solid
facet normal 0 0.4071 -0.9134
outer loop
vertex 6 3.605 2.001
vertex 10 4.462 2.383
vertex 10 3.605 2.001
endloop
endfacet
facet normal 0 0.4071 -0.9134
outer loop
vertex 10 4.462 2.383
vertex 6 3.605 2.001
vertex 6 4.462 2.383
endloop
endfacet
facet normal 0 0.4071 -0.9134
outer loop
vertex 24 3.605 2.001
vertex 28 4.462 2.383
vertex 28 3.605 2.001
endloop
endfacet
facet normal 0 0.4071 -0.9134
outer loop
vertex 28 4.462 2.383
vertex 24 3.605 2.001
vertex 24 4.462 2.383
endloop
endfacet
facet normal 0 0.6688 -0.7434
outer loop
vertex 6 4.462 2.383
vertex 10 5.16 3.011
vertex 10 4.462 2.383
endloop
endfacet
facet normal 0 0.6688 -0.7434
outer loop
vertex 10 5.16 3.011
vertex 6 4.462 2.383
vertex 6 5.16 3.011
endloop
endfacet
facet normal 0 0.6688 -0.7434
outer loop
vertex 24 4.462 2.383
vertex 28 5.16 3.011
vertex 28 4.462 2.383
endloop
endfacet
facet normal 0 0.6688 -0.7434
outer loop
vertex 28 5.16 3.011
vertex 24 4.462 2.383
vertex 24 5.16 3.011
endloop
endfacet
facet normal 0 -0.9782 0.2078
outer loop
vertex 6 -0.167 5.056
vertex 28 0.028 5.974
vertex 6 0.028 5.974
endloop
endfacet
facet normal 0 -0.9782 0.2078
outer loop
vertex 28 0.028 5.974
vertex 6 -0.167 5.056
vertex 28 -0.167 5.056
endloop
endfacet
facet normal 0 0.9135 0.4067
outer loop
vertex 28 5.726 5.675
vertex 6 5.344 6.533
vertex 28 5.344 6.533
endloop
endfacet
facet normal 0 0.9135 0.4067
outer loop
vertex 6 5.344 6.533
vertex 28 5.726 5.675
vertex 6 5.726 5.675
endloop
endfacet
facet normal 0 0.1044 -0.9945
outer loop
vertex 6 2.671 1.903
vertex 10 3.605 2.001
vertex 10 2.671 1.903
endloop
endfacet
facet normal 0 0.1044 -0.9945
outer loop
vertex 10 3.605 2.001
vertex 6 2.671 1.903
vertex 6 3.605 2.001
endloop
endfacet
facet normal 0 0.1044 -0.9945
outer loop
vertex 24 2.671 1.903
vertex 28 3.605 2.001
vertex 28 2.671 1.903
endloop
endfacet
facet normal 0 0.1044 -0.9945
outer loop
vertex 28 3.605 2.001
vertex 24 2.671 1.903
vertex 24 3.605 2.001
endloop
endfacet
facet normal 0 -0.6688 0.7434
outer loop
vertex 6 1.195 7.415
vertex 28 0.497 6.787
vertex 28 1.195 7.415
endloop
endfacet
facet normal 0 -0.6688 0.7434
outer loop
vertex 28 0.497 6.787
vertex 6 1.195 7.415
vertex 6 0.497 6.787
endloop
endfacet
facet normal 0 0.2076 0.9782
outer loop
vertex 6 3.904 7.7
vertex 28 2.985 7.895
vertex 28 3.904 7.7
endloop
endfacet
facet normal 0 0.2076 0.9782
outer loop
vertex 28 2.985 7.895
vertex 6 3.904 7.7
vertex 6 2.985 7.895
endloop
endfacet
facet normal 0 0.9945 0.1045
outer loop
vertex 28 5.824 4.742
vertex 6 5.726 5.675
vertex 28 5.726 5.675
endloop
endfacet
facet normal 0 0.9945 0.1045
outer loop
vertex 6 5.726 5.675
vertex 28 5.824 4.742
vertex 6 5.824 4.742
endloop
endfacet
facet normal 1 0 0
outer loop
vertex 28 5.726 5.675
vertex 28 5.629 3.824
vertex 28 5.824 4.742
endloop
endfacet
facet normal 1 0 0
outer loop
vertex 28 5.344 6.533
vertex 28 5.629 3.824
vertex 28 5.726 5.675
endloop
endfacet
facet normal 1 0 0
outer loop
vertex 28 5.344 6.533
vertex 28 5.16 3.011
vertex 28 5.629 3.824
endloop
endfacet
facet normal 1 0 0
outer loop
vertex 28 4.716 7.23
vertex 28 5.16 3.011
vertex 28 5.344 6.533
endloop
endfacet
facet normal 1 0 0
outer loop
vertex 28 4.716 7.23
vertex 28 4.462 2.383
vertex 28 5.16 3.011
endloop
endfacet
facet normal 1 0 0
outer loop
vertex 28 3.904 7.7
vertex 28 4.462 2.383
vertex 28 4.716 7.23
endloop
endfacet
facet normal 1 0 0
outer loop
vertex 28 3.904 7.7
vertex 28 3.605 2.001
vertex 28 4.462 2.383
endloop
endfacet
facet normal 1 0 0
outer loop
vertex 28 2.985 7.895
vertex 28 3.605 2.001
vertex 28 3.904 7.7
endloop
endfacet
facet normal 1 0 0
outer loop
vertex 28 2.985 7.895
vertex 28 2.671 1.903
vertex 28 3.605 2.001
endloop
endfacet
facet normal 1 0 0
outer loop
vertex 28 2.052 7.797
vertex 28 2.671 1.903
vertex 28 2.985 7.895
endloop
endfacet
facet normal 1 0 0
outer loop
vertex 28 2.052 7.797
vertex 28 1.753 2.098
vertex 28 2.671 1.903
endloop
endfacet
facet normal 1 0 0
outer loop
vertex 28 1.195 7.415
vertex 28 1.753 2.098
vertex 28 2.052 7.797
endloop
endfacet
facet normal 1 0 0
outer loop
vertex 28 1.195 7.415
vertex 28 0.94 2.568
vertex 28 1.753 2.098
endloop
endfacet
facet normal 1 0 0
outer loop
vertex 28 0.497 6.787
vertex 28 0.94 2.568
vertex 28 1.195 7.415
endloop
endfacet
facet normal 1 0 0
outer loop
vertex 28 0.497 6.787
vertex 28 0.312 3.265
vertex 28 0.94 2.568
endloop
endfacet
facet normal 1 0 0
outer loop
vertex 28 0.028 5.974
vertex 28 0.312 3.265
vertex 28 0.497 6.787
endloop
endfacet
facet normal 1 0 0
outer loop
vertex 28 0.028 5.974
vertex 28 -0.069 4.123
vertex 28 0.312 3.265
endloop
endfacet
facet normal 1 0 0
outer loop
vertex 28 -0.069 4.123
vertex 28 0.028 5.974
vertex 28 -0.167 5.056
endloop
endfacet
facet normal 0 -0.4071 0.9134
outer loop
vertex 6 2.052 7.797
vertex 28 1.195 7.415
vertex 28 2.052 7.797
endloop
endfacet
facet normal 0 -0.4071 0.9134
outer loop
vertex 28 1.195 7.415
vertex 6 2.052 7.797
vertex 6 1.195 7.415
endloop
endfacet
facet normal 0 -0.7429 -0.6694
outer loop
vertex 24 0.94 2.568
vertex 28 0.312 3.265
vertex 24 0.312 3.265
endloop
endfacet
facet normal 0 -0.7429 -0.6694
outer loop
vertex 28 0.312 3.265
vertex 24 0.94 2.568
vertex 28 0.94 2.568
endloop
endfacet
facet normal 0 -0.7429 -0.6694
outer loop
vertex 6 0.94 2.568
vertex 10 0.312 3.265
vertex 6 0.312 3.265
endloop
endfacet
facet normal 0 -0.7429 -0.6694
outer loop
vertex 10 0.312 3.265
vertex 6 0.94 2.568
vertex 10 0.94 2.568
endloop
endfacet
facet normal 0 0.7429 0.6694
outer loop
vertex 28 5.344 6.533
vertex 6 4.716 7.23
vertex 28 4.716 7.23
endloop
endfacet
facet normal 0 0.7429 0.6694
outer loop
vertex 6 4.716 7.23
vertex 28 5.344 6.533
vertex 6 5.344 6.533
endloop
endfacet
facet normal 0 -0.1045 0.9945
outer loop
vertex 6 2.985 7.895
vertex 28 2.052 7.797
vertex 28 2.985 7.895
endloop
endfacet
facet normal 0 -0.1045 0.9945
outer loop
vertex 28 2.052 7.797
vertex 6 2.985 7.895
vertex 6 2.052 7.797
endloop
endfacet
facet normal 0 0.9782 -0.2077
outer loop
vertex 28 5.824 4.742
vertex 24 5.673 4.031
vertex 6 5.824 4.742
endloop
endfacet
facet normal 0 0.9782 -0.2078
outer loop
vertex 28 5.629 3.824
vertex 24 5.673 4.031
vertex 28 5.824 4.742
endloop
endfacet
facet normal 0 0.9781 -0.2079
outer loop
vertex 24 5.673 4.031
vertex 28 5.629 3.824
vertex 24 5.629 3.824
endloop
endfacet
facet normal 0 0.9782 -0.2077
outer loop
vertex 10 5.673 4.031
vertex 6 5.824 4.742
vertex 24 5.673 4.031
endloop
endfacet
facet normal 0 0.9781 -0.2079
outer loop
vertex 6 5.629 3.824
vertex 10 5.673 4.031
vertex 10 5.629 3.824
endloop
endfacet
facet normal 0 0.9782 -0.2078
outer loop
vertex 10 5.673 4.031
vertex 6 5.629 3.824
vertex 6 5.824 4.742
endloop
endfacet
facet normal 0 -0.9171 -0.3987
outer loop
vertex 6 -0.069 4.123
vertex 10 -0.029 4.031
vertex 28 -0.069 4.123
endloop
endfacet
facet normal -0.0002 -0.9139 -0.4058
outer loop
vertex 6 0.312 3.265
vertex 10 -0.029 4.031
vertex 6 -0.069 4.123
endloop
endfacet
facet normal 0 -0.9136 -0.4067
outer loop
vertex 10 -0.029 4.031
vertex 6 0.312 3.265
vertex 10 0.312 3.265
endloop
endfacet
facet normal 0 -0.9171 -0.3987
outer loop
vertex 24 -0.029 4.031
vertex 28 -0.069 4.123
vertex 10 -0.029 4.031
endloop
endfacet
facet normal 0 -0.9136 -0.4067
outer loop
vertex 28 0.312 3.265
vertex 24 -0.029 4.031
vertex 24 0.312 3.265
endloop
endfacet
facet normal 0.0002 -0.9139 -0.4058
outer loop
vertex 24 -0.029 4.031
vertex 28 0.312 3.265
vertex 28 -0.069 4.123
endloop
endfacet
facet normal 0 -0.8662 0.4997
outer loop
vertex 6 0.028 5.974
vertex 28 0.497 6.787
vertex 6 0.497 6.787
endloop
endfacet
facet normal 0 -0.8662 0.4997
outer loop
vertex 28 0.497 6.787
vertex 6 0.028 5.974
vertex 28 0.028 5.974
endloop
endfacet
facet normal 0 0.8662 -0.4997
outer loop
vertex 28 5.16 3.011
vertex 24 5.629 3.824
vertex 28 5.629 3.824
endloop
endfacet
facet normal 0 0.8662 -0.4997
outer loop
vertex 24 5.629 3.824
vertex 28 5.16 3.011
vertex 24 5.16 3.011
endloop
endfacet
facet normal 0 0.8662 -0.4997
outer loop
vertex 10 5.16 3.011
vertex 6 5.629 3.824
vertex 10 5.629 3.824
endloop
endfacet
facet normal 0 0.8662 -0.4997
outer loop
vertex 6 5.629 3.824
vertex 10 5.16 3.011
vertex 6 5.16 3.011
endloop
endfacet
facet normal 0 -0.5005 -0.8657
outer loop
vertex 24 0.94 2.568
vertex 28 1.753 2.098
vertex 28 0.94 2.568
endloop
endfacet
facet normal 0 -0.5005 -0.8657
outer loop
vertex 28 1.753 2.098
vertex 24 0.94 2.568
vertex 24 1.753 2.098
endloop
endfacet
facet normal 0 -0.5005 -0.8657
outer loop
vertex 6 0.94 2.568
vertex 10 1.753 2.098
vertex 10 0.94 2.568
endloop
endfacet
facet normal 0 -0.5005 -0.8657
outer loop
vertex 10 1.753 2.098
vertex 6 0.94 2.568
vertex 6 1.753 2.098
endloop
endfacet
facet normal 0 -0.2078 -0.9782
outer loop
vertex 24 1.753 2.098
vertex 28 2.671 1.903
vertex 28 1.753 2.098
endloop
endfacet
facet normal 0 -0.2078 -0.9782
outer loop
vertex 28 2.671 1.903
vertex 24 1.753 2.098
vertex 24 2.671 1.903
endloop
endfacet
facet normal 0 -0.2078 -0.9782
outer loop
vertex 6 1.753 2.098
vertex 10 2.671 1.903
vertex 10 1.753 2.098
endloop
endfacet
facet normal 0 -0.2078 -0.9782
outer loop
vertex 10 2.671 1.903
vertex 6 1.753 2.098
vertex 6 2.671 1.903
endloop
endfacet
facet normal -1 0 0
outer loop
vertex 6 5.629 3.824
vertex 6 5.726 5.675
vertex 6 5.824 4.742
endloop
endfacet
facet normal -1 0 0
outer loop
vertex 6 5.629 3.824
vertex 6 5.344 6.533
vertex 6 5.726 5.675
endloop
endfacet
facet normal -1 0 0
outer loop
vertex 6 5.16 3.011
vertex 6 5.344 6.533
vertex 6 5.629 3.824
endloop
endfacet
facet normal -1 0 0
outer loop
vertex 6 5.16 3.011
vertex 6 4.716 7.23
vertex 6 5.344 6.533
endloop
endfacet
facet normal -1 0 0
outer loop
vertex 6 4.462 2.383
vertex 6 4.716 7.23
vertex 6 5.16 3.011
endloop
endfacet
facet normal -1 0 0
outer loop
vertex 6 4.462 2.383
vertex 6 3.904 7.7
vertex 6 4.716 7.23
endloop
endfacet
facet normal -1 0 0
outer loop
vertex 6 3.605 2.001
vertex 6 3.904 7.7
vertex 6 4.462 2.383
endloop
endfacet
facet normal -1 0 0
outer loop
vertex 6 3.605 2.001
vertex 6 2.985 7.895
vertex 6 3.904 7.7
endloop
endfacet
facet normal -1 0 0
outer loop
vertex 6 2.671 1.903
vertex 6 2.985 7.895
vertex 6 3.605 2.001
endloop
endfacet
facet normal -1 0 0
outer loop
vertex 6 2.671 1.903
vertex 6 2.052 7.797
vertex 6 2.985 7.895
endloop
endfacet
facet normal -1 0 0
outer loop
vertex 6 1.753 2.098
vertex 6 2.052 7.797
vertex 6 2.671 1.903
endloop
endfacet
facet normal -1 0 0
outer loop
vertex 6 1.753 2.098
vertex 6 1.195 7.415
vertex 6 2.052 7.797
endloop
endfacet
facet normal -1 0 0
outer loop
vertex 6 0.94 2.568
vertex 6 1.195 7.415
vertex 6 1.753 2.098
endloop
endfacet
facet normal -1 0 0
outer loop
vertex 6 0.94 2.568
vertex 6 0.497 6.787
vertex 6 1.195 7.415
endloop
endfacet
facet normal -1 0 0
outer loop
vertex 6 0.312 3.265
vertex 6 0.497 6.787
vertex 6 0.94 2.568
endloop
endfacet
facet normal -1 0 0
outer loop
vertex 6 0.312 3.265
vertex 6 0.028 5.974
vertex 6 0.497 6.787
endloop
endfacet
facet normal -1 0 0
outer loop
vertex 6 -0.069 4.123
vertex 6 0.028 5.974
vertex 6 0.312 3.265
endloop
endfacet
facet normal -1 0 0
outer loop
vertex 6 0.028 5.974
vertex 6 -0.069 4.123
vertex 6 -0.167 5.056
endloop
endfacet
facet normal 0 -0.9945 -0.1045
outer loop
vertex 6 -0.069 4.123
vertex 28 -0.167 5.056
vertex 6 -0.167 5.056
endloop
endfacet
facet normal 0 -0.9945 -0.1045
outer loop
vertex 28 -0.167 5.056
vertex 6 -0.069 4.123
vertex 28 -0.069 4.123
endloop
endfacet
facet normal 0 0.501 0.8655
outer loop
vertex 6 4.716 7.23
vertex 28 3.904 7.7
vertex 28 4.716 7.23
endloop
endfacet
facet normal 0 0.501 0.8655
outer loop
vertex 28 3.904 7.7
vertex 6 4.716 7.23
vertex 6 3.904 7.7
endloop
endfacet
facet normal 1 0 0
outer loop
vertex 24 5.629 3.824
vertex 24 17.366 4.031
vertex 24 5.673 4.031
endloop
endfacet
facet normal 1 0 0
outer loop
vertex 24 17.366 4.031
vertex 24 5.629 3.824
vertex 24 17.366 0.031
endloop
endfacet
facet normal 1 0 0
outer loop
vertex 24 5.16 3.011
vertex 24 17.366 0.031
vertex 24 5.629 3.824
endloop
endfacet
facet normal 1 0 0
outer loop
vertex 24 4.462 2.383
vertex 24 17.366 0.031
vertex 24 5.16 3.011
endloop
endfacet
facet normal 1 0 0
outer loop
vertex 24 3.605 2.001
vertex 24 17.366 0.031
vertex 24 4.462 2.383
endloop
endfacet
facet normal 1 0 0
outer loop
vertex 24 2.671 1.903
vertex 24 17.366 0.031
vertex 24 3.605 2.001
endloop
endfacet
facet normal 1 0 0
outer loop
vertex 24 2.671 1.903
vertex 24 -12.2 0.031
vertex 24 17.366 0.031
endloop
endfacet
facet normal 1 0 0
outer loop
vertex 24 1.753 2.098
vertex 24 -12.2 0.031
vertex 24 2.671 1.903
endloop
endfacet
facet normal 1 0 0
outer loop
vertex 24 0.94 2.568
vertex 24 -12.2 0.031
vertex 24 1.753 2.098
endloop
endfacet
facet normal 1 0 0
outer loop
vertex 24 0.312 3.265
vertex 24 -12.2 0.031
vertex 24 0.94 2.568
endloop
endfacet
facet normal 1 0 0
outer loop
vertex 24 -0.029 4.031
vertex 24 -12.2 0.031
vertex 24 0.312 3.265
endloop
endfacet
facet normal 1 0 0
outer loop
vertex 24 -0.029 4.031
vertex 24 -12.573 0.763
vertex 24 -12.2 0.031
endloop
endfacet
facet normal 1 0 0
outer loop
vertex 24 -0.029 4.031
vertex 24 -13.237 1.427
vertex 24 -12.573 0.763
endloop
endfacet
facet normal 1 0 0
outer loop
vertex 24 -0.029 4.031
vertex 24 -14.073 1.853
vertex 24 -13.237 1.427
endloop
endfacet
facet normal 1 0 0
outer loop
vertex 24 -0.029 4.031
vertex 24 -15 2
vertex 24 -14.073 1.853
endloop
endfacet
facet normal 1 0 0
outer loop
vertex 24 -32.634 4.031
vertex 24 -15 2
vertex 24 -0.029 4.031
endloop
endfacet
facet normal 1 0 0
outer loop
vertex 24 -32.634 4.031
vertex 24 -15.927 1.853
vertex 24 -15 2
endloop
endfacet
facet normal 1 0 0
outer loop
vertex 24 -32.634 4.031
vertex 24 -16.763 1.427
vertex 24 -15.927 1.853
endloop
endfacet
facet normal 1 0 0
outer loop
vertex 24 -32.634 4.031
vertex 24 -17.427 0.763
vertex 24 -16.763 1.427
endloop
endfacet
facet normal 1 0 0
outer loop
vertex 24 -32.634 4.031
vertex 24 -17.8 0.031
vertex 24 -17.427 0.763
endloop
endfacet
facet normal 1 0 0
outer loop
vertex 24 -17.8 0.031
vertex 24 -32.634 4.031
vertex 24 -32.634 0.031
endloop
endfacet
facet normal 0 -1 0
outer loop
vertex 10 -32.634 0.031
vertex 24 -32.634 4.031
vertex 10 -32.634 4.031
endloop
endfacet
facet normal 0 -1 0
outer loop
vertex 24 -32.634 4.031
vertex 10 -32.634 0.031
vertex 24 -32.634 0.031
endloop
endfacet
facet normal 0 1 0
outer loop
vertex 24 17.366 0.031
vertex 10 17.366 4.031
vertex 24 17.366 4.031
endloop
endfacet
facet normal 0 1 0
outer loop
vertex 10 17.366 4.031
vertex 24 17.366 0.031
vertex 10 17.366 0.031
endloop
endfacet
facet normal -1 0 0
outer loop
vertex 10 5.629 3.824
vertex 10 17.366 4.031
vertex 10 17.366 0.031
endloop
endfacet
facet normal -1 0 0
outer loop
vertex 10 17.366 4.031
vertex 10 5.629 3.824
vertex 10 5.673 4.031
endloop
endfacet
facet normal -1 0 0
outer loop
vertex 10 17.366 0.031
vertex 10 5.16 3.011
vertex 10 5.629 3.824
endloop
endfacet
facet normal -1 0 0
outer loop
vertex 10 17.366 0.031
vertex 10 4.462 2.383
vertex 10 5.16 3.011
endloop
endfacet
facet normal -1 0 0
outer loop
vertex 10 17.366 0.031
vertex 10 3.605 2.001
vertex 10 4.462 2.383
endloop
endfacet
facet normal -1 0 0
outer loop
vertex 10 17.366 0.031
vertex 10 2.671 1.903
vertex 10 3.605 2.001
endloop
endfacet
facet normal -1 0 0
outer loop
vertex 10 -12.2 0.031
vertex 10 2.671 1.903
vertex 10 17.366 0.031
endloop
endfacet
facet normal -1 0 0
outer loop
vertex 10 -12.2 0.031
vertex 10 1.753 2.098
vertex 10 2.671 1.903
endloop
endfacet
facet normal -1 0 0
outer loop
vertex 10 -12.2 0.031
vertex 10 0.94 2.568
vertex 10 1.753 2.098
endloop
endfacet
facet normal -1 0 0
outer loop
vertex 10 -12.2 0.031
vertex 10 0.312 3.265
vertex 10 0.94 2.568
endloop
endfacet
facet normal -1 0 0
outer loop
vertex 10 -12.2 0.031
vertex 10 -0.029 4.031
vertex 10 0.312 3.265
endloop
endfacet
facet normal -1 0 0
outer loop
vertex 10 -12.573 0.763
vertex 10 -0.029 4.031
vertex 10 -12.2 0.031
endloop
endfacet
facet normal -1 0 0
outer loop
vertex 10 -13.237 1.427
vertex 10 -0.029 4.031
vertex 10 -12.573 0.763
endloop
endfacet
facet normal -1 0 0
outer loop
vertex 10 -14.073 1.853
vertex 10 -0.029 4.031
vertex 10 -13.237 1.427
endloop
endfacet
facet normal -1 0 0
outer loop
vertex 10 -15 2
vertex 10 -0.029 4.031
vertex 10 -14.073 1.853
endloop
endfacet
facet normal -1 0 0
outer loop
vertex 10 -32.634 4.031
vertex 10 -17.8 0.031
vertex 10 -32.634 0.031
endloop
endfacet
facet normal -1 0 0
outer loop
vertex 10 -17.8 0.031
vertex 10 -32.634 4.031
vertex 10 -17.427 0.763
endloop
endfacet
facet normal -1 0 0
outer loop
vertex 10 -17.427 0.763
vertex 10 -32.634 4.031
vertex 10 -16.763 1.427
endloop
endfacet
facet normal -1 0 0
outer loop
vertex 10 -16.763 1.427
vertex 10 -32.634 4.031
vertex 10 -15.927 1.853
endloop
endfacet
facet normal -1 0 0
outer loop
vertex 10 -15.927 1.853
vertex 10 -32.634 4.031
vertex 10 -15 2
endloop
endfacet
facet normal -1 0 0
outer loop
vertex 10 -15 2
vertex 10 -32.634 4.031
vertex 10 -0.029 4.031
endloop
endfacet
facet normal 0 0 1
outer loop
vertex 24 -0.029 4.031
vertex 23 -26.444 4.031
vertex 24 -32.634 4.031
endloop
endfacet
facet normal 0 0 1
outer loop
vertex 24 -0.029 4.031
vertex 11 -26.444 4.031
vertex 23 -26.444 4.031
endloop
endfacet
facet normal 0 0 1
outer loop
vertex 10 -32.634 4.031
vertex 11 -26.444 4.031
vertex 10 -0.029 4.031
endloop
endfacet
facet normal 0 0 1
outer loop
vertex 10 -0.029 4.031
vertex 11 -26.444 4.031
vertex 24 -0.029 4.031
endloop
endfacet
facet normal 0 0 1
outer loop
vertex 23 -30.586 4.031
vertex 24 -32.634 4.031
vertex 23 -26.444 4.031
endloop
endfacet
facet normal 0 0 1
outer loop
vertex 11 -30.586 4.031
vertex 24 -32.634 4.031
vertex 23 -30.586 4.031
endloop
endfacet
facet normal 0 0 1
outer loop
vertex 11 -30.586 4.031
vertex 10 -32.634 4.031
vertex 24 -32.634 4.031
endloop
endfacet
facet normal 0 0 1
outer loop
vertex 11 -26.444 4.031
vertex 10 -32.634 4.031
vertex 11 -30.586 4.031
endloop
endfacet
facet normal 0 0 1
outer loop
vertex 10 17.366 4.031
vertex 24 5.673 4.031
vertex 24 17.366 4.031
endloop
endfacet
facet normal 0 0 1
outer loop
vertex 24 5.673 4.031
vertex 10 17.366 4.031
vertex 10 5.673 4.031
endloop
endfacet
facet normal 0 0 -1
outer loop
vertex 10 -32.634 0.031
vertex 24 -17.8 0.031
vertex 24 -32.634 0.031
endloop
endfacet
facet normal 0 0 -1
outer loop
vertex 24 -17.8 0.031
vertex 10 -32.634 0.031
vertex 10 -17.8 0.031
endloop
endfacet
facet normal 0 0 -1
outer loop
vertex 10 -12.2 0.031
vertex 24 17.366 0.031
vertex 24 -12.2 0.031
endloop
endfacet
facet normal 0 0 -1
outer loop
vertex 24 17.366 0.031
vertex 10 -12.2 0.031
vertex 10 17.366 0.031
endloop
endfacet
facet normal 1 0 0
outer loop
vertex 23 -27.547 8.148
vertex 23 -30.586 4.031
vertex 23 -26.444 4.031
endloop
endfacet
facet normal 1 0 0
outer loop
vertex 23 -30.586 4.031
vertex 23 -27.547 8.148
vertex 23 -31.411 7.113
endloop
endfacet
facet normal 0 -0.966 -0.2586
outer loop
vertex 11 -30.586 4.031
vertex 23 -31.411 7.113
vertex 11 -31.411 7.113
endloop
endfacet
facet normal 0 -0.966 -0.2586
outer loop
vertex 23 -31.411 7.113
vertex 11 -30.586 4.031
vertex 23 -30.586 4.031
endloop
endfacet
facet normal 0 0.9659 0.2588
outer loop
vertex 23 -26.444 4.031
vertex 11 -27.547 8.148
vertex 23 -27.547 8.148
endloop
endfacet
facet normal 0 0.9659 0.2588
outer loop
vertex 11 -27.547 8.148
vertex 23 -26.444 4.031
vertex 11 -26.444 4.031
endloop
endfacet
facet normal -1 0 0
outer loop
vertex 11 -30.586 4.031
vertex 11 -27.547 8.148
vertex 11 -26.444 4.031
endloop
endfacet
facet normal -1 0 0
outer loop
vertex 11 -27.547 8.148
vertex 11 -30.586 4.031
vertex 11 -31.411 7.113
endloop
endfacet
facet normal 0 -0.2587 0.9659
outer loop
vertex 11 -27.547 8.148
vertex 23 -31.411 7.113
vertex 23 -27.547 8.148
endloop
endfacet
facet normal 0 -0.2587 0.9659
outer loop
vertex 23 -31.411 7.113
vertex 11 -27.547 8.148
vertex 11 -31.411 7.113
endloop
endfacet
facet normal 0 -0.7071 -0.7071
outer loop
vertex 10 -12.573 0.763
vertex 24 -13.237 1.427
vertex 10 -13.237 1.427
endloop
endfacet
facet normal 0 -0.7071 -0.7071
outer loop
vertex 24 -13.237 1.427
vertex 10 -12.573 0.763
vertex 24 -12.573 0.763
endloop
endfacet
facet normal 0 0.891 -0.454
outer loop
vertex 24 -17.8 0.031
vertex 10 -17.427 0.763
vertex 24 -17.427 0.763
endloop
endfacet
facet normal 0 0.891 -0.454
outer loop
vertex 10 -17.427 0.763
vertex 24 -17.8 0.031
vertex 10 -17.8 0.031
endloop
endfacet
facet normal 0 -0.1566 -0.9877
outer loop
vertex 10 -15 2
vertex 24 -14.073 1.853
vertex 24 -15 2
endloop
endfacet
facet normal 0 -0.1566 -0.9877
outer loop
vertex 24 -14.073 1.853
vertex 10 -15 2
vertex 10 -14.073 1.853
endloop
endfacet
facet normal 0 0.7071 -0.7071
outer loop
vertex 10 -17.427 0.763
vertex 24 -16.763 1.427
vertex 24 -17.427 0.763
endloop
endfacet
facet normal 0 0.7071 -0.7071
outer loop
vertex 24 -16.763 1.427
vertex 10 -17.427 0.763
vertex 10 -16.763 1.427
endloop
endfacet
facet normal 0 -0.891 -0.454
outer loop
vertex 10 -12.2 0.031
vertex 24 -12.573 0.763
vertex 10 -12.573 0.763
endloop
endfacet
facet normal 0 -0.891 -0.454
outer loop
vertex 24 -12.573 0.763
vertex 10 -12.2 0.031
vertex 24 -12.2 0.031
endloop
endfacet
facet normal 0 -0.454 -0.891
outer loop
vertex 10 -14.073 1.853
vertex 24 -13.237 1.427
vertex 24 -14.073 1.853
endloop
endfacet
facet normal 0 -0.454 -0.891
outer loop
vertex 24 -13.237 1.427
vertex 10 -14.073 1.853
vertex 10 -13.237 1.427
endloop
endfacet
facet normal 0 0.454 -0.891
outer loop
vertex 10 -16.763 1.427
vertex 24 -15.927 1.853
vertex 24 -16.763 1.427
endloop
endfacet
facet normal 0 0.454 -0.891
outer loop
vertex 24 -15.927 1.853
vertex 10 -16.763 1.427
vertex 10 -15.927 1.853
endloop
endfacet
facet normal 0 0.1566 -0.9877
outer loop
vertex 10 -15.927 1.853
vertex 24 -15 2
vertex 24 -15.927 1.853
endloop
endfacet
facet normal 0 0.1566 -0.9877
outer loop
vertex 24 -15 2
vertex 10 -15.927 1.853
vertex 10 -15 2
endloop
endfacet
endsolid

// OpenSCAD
$fn=20;   // For persion of polygons

difference(){
union(){
rotate([105,0,0]){
translate([0,6,115]){
translate([6,-2,-119]){  // release handle1
rotate([0,90,0]){
  cylinder(r=3,h=22);
}}
rotate([-15,0,0]){  // release handle2
translate([10,24,-130]){
  cube([14,4,50]);}}

translate([11,4,-90.5]){ // cut the top off
    cube([12,5,4]);
}
}}
}  // union

translate([0,-15,-1]){  // notch
rotate([0,90,0]){
  cylinder(r=3,h=35);
}}

}
